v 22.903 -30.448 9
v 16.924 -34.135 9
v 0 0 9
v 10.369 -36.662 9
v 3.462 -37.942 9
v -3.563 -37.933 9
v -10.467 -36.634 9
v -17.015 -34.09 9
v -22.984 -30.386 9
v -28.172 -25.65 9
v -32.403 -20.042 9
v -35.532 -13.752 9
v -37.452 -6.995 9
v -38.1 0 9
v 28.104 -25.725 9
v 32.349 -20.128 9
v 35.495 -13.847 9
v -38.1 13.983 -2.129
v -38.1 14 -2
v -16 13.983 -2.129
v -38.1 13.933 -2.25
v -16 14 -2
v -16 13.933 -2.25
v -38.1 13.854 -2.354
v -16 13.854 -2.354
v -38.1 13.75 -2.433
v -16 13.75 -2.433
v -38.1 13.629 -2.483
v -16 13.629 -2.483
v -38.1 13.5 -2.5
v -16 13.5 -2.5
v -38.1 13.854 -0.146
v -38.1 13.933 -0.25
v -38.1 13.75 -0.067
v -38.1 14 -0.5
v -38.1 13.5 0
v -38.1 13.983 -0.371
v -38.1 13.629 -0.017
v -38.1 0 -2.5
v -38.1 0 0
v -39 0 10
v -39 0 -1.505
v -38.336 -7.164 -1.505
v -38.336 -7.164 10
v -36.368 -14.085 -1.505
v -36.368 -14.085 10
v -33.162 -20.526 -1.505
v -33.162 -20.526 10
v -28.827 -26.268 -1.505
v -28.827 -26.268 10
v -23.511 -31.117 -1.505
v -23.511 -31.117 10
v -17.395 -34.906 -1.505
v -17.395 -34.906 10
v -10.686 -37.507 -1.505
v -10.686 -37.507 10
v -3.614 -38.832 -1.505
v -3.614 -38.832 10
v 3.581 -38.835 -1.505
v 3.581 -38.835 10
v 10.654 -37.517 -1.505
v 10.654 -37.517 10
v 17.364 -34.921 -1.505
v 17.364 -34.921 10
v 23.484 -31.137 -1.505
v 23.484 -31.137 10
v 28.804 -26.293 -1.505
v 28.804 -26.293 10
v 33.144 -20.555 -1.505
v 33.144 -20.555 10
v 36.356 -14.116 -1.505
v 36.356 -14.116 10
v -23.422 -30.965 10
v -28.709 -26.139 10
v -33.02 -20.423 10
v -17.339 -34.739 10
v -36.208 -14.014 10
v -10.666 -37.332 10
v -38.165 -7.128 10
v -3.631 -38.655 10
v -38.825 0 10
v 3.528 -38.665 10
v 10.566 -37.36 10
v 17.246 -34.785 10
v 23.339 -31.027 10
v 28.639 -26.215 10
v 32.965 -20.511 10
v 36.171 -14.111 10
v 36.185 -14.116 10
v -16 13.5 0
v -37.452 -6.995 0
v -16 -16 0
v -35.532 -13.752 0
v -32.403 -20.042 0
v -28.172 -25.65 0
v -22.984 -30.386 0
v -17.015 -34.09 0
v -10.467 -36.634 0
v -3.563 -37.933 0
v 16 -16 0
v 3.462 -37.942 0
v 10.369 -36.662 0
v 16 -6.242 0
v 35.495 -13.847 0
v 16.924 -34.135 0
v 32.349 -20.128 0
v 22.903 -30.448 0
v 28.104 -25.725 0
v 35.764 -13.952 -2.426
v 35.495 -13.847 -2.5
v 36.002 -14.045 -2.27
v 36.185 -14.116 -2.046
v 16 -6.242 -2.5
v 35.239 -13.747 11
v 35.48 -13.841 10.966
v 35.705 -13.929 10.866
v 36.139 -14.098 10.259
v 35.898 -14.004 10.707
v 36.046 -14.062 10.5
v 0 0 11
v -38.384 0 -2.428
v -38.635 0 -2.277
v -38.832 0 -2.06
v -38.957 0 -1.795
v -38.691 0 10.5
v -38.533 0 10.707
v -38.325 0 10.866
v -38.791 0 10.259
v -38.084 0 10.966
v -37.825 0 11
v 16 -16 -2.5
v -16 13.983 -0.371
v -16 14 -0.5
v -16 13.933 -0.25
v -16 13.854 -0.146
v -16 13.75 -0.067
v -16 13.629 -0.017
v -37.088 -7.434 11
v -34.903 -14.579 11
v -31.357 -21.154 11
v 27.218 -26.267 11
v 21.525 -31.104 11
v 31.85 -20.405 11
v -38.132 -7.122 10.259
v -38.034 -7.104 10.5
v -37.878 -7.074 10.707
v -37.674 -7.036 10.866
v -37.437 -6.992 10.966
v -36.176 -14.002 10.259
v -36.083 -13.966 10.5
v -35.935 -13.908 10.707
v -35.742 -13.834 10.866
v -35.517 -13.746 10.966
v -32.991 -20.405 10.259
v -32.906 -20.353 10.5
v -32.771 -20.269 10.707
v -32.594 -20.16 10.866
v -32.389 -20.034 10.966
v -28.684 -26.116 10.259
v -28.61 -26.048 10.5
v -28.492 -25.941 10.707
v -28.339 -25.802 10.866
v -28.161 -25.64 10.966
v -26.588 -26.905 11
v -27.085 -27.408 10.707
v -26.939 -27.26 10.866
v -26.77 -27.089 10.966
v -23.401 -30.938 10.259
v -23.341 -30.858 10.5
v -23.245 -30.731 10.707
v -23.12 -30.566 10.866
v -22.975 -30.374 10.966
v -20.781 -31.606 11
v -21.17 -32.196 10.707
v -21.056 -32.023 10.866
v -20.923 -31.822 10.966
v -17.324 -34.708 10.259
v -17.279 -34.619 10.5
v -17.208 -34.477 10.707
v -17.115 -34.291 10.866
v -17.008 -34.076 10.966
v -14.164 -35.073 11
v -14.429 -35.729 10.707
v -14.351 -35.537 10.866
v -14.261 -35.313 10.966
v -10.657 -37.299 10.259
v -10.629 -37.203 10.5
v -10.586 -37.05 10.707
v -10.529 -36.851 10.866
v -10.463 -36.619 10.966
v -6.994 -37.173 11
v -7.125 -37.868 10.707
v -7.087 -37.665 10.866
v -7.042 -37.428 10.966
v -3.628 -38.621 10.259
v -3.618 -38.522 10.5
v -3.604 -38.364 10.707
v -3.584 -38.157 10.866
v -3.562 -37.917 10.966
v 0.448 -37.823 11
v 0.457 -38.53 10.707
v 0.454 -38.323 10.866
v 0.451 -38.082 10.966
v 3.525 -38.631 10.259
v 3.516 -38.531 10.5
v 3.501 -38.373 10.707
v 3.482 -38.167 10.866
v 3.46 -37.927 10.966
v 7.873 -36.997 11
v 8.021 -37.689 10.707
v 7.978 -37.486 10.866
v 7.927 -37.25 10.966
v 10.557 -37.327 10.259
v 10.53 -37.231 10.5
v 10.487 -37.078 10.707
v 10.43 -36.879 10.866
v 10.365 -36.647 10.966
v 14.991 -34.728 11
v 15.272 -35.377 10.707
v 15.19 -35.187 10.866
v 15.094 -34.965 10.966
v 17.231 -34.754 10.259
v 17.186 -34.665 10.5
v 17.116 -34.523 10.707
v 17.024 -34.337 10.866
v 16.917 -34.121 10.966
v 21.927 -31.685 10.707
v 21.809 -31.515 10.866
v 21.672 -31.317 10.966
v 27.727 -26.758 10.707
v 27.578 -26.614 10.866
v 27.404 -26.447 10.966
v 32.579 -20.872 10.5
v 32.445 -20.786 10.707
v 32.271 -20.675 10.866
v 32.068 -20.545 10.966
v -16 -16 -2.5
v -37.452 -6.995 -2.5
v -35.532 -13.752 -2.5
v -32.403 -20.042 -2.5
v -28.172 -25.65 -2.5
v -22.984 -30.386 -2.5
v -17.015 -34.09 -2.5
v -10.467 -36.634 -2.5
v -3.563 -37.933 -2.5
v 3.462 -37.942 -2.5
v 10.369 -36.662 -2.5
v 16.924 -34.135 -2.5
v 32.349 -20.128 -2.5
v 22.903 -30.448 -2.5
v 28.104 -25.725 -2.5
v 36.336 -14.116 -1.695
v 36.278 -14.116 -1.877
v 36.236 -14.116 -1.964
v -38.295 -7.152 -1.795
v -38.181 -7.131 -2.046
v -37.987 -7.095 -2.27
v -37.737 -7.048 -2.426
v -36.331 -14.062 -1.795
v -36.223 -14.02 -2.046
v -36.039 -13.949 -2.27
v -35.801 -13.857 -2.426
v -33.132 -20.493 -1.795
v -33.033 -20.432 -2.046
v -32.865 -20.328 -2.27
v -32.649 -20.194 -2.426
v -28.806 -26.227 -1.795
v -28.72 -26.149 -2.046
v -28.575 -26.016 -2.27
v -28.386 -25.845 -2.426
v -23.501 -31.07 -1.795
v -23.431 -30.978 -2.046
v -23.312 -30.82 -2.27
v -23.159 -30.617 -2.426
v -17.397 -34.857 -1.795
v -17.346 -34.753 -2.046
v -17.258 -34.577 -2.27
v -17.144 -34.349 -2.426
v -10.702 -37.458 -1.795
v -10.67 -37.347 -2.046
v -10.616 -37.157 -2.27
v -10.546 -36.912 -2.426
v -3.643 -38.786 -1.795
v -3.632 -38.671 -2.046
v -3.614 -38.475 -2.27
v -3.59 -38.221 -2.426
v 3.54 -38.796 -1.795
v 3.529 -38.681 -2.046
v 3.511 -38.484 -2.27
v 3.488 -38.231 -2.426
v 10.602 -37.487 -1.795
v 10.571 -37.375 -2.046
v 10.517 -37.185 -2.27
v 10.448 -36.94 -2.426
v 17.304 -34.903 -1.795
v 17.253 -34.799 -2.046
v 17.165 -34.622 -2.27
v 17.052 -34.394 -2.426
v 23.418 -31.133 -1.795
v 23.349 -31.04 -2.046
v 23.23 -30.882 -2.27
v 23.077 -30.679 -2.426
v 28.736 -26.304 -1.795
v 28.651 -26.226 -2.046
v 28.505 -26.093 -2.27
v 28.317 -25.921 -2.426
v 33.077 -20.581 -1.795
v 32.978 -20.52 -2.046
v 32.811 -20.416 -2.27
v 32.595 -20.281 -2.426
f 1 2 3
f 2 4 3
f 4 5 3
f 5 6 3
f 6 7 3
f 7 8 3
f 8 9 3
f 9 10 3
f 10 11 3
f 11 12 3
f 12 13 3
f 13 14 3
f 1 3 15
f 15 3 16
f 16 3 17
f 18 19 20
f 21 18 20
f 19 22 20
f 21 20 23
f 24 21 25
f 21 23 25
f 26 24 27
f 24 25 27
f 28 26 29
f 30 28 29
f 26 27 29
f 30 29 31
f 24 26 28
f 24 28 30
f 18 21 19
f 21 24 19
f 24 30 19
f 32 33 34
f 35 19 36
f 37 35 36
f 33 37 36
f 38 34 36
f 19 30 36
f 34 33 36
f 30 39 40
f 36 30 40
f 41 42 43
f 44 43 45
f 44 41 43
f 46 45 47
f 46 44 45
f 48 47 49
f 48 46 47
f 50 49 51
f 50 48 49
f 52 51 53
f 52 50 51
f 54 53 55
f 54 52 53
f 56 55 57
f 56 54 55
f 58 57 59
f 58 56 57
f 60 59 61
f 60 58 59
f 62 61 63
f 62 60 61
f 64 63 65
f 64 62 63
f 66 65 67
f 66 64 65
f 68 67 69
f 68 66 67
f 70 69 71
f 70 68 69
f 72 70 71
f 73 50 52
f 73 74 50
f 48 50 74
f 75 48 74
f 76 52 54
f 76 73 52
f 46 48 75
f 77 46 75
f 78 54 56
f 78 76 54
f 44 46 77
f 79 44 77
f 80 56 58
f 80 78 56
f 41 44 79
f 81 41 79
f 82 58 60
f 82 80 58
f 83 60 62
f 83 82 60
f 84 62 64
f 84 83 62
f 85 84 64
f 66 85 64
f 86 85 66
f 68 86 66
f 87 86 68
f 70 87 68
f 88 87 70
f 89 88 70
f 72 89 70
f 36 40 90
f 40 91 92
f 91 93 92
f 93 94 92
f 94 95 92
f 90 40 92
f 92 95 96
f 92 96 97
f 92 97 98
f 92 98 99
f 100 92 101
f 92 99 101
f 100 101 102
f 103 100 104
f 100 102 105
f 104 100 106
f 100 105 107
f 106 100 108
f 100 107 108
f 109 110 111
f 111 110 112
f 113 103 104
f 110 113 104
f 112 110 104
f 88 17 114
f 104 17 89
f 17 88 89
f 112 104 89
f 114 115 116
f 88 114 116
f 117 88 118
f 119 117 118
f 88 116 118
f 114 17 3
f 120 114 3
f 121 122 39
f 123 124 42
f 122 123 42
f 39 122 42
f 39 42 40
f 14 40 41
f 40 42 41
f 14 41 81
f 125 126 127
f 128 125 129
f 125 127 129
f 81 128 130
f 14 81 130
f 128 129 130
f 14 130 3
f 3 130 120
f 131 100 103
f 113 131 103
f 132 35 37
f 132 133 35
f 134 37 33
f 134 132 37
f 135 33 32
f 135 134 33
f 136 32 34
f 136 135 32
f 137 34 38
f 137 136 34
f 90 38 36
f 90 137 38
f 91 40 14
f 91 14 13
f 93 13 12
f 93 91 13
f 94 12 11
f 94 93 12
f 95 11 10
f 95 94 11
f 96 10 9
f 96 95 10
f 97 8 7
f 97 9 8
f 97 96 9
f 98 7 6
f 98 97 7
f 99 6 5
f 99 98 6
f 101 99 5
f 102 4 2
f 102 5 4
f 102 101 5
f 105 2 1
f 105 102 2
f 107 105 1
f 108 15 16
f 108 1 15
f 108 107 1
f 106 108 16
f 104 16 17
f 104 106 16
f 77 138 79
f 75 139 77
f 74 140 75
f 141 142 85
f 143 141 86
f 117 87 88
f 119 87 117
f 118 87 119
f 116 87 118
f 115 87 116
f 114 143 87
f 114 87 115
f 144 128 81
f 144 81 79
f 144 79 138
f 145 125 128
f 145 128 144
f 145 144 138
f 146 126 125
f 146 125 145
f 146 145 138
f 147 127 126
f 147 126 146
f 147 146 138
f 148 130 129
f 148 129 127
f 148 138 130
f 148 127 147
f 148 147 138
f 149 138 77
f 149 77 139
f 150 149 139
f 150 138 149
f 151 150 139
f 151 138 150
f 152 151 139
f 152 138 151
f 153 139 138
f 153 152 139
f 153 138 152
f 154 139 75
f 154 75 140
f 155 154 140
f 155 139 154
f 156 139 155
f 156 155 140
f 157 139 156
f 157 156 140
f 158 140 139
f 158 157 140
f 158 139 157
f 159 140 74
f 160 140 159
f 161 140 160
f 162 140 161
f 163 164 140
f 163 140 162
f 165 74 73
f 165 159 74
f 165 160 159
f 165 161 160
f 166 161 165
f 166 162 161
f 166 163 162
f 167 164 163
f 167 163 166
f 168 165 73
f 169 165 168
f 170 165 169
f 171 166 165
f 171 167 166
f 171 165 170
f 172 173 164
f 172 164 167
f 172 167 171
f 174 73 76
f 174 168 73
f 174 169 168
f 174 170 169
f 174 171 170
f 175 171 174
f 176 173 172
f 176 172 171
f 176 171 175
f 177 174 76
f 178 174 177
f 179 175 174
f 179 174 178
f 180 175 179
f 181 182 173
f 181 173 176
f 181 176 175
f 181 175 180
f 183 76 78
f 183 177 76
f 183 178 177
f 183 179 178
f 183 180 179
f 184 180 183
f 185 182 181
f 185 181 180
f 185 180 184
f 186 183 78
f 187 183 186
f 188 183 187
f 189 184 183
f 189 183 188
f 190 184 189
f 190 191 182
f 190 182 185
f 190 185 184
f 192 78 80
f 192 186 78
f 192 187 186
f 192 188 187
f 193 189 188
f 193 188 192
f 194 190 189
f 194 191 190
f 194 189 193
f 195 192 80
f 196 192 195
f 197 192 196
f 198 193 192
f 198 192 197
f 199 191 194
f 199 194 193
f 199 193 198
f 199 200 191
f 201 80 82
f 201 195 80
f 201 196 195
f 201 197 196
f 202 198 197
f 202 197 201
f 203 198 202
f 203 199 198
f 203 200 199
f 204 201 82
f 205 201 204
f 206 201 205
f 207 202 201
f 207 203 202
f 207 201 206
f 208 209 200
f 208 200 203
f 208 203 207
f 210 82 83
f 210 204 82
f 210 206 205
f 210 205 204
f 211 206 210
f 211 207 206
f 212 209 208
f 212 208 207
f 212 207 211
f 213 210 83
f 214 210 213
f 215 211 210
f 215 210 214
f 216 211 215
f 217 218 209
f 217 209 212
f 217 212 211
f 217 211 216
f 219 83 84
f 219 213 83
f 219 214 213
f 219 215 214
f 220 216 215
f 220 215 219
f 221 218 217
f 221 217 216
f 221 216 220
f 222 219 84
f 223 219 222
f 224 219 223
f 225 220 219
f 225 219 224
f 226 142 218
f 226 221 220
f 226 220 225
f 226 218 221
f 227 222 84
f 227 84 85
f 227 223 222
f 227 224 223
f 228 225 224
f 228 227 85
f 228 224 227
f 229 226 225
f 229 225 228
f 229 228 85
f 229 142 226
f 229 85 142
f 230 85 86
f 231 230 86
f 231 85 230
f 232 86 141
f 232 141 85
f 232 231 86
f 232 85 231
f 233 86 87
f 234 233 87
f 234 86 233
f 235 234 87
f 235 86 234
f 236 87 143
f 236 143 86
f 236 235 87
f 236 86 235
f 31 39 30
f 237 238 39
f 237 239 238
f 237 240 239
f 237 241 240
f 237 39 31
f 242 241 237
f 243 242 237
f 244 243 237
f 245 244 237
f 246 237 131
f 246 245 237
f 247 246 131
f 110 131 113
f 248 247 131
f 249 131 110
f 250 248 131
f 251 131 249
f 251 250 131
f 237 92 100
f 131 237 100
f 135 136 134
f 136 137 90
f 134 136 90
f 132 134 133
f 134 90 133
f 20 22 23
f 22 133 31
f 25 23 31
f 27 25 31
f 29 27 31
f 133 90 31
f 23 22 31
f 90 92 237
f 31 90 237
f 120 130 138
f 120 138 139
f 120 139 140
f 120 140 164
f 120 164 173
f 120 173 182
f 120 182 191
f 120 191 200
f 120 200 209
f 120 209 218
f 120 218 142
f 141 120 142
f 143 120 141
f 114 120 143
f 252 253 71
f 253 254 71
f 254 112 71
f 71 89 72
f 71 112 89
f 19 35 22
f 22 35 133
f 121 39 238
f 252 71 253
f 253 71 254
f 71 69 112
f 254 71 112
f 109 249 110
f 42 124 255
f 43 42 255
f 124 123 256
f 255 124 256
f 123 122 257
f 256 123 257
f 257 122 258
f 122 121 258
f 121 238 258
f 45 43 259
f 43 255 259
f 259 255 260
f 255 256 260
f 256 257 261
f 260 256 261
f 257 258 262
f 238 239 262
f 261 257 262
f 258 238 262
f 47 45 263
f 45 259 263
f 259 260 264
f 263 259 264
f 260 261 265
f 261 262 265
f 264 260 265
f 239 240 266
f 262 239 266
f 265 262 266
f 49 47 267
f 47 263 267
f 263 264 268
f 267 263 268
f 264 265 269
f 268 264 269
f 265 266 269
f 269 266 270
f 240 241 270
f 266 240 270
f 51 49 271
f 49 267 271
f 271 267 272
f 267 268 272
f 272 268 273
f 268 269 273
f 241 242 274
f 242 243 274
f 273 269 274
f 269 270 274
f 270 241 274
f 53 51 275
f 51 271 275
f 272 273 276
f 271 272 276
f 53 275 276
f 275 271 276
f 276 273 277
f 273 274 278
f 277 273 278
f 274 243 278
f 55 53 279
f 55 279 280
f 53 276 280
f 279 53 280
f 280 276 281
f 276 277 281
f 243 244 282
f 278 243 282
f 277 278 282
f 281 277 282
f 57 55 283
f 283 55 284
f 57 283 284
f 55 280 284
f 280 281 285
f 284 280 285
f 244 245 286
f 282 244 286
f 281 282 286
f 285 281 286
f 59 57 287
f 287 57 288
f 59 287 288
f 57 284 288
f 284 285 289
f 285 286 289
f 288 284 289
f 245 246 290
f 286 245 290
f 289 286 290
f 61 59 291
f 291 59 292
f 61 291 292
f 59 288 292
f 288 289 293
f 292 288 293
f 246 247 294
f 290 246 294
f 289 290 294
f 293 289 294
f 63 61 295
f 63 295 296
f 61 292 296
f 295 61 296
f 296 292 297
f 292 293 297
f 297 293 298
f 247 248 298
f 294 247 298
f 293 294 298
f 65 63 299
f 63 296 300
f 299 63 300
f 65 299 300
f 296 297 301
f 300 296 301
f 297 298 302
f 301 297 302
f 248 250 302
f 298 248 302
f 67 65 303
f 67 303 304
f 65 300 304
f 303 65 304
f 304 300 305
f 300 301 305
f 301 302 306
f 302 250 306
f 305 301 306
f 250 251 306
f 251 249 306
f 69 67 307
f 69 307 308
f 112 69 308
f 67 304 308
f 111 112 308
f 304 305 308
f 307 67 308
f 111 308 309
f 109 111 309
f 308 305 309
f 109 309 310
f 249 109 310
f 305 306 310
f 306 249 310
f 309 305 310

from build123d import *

# Parameters (mm, degrees)
F0_R         = 39
F0_R_2       = 38.1
F1_DEPTH     = 9
F2_DEPTH     = 10
F0_W         = 32
F0_H         = 32
F3_DEPTH     = 2.5
F5_R         = 38.8254389769
F6_DEPTH     = 2
F7_R         = 0.99999
F9_DEPTH     = 12.5
F10_DEPTH    = 12.5
F11_DEPTH    = 2.5
F12_T2_ANGLE = 166.0974661722
F13_DEPTH    = 14
F14_R        = 0.5


# Not quite as in the source:
# - a fillet or chamfer that OpenCascade refuses, or shapes differently, is made with other operations: its cross-section is extruded or revolved along the edge and cut away or added
# - a fillet or chamfer is up to 0.001 mm smaller than in the source, because OpenCascade refuses the exact size


with BuildPart() as f1:
    # F0 (on Top) → F1 (new body)
    with BuildSketch(Plane.XY):
        Circle(F0_R)
        Circle(F0_R_2, mode=Mode.SUBTRACT)
    extrude(amount=F1_DEPTH)

    # F0 (on Top) → F2 (join)
    with BuildSketch(Plane.XY):
        Circle(F0_R)
        Circle(F0_R_2, mode=Mode.SUBTRACT)
    extrude(amount=F2_DEPTH)

    # F5 (on offset) → F6 (join)
    with BuildSketch(Plane.XY.offset(9)):
        Circle(F5_R)
    extrude(amount=F6_DEPTH)

    # F7 (radius 1 in the source; OpenCascade refuses exactly that, so slightly less here)
    f7_edges = [f1.edges().sort_by_distance(p)[0] for p in [
        (-38.825439, 0, 11),
    ]]
    fillet(f7_edges, radius=F7_R)


with BuildPart() as f3:
    # F0 (on Top) → F3 (new body)
    with BuildSketch(Plane.XY):
        Circle(F0_R_2)
        Rectangle(F0_W, F0_H, mode=Mode.SUBTRACT)
    extrude(amount=-F3_DEPTH)


with BuildPart() as f9:
    # F8 (on Top) → F9 (new body, symmetric)
    with BuildSketch(Plane.XY):
        Polygon((-41.2051826715, 48.0051673949), (-42.0097357945, 0), (0, 0), (36.1852608621, -14.1163477674), (49.7808791697, -14.1163477674), (49.2908842862, 48.0051673949), align=None)
    extrude(amount=F9_DEPTH, both=True)


with BuildPart() as f10_tool:
    # F8 (on Top) → F10 (new body, symmetric)
    with BuildSketch(Plane.XY):
        Polygon((-41.2051826715, 48.0051673949), (-42.0097357945, 0), (0, 0), (36.1852608621, -14.1163477674), (49.7808791697, -14.1163477674), (49.2908842862, 48.0051673949), align=None)
    extrude(amount=F10_DEPTH, both=True)


with BuildPart() as f1_1:
    add(f1.part)

    # F10: cut by f10_tool
    add(f10_tool.part, mode=Mode.SUBTRACT)


with BuildPart() as f3_1:
    add(f3.part)

    # F10: cut by f10_tool
    add(f10_tool.part, mode=Mode.SUBTRACT)


with BuildPart() as f9_1:
    add(f9.part)

    # F10: cut by f10_tool
    add(f10_tool.part, mode=Mode.SUBTRACT)


with BuildPart() as f11:
    # F11 (new): a face of the model
    f11_faces = [f1_1.part.faces().sort_by_distance(p)[0] for p in [
        (-38.55, -0.8484965841, 0),
    ]]
    extrude(f11_faces, amount=F11_DEPTH)

    # F12: fillet of radius 1 on 1 edges, made by hand

    # F12_s1 → F12_t2 (revolve, cut)
    with BuildSketch(Plane(origin=(0, 0, 0), x_dir=(0, 0, 1), z_dir=(0.0638176413, 0.9979615767, 0))):
        with BuildLine():
            ThreePointArc((-1.5050125629, -39), (-2.1758329561, -38.7416198487), (-2.5, -38.1))
            Line((-2.5, -38.1), (-2.5, -39))
            Line((-2.5, -39), (-1.5050125629, -39))
        make_face()
    revolve(axis=Axis((0, 0, -2.5), (0, 0, 1)), revolution_arc=F12_T2_ANGLE, mode=Mode.SUBTRACT)


with BuildPart() as f1_2:
    add(f1_1.part)

    # F13 (add): a face of the model
    f13_faces = [f3_1.part.faces().sort_by_distance(p)[0] for p in [
        (-27.05, 0, -1.25),
    ]]

    add(f3_1.part)  # F13 merges F3

    add(f11.part)  # F13 merges F11
    extrude(f13_faces, amount=F13_DEPTH)

    # F14
    f14_edges = [f1_2.edges().sort_by_distance(p)[0] for p in [
        (-27.05, 14, -2.5),
        (-27.05, 14, 0),
    ]]
    fillet(f14_edges, radius=F14_R)


solid = f1_2.part
